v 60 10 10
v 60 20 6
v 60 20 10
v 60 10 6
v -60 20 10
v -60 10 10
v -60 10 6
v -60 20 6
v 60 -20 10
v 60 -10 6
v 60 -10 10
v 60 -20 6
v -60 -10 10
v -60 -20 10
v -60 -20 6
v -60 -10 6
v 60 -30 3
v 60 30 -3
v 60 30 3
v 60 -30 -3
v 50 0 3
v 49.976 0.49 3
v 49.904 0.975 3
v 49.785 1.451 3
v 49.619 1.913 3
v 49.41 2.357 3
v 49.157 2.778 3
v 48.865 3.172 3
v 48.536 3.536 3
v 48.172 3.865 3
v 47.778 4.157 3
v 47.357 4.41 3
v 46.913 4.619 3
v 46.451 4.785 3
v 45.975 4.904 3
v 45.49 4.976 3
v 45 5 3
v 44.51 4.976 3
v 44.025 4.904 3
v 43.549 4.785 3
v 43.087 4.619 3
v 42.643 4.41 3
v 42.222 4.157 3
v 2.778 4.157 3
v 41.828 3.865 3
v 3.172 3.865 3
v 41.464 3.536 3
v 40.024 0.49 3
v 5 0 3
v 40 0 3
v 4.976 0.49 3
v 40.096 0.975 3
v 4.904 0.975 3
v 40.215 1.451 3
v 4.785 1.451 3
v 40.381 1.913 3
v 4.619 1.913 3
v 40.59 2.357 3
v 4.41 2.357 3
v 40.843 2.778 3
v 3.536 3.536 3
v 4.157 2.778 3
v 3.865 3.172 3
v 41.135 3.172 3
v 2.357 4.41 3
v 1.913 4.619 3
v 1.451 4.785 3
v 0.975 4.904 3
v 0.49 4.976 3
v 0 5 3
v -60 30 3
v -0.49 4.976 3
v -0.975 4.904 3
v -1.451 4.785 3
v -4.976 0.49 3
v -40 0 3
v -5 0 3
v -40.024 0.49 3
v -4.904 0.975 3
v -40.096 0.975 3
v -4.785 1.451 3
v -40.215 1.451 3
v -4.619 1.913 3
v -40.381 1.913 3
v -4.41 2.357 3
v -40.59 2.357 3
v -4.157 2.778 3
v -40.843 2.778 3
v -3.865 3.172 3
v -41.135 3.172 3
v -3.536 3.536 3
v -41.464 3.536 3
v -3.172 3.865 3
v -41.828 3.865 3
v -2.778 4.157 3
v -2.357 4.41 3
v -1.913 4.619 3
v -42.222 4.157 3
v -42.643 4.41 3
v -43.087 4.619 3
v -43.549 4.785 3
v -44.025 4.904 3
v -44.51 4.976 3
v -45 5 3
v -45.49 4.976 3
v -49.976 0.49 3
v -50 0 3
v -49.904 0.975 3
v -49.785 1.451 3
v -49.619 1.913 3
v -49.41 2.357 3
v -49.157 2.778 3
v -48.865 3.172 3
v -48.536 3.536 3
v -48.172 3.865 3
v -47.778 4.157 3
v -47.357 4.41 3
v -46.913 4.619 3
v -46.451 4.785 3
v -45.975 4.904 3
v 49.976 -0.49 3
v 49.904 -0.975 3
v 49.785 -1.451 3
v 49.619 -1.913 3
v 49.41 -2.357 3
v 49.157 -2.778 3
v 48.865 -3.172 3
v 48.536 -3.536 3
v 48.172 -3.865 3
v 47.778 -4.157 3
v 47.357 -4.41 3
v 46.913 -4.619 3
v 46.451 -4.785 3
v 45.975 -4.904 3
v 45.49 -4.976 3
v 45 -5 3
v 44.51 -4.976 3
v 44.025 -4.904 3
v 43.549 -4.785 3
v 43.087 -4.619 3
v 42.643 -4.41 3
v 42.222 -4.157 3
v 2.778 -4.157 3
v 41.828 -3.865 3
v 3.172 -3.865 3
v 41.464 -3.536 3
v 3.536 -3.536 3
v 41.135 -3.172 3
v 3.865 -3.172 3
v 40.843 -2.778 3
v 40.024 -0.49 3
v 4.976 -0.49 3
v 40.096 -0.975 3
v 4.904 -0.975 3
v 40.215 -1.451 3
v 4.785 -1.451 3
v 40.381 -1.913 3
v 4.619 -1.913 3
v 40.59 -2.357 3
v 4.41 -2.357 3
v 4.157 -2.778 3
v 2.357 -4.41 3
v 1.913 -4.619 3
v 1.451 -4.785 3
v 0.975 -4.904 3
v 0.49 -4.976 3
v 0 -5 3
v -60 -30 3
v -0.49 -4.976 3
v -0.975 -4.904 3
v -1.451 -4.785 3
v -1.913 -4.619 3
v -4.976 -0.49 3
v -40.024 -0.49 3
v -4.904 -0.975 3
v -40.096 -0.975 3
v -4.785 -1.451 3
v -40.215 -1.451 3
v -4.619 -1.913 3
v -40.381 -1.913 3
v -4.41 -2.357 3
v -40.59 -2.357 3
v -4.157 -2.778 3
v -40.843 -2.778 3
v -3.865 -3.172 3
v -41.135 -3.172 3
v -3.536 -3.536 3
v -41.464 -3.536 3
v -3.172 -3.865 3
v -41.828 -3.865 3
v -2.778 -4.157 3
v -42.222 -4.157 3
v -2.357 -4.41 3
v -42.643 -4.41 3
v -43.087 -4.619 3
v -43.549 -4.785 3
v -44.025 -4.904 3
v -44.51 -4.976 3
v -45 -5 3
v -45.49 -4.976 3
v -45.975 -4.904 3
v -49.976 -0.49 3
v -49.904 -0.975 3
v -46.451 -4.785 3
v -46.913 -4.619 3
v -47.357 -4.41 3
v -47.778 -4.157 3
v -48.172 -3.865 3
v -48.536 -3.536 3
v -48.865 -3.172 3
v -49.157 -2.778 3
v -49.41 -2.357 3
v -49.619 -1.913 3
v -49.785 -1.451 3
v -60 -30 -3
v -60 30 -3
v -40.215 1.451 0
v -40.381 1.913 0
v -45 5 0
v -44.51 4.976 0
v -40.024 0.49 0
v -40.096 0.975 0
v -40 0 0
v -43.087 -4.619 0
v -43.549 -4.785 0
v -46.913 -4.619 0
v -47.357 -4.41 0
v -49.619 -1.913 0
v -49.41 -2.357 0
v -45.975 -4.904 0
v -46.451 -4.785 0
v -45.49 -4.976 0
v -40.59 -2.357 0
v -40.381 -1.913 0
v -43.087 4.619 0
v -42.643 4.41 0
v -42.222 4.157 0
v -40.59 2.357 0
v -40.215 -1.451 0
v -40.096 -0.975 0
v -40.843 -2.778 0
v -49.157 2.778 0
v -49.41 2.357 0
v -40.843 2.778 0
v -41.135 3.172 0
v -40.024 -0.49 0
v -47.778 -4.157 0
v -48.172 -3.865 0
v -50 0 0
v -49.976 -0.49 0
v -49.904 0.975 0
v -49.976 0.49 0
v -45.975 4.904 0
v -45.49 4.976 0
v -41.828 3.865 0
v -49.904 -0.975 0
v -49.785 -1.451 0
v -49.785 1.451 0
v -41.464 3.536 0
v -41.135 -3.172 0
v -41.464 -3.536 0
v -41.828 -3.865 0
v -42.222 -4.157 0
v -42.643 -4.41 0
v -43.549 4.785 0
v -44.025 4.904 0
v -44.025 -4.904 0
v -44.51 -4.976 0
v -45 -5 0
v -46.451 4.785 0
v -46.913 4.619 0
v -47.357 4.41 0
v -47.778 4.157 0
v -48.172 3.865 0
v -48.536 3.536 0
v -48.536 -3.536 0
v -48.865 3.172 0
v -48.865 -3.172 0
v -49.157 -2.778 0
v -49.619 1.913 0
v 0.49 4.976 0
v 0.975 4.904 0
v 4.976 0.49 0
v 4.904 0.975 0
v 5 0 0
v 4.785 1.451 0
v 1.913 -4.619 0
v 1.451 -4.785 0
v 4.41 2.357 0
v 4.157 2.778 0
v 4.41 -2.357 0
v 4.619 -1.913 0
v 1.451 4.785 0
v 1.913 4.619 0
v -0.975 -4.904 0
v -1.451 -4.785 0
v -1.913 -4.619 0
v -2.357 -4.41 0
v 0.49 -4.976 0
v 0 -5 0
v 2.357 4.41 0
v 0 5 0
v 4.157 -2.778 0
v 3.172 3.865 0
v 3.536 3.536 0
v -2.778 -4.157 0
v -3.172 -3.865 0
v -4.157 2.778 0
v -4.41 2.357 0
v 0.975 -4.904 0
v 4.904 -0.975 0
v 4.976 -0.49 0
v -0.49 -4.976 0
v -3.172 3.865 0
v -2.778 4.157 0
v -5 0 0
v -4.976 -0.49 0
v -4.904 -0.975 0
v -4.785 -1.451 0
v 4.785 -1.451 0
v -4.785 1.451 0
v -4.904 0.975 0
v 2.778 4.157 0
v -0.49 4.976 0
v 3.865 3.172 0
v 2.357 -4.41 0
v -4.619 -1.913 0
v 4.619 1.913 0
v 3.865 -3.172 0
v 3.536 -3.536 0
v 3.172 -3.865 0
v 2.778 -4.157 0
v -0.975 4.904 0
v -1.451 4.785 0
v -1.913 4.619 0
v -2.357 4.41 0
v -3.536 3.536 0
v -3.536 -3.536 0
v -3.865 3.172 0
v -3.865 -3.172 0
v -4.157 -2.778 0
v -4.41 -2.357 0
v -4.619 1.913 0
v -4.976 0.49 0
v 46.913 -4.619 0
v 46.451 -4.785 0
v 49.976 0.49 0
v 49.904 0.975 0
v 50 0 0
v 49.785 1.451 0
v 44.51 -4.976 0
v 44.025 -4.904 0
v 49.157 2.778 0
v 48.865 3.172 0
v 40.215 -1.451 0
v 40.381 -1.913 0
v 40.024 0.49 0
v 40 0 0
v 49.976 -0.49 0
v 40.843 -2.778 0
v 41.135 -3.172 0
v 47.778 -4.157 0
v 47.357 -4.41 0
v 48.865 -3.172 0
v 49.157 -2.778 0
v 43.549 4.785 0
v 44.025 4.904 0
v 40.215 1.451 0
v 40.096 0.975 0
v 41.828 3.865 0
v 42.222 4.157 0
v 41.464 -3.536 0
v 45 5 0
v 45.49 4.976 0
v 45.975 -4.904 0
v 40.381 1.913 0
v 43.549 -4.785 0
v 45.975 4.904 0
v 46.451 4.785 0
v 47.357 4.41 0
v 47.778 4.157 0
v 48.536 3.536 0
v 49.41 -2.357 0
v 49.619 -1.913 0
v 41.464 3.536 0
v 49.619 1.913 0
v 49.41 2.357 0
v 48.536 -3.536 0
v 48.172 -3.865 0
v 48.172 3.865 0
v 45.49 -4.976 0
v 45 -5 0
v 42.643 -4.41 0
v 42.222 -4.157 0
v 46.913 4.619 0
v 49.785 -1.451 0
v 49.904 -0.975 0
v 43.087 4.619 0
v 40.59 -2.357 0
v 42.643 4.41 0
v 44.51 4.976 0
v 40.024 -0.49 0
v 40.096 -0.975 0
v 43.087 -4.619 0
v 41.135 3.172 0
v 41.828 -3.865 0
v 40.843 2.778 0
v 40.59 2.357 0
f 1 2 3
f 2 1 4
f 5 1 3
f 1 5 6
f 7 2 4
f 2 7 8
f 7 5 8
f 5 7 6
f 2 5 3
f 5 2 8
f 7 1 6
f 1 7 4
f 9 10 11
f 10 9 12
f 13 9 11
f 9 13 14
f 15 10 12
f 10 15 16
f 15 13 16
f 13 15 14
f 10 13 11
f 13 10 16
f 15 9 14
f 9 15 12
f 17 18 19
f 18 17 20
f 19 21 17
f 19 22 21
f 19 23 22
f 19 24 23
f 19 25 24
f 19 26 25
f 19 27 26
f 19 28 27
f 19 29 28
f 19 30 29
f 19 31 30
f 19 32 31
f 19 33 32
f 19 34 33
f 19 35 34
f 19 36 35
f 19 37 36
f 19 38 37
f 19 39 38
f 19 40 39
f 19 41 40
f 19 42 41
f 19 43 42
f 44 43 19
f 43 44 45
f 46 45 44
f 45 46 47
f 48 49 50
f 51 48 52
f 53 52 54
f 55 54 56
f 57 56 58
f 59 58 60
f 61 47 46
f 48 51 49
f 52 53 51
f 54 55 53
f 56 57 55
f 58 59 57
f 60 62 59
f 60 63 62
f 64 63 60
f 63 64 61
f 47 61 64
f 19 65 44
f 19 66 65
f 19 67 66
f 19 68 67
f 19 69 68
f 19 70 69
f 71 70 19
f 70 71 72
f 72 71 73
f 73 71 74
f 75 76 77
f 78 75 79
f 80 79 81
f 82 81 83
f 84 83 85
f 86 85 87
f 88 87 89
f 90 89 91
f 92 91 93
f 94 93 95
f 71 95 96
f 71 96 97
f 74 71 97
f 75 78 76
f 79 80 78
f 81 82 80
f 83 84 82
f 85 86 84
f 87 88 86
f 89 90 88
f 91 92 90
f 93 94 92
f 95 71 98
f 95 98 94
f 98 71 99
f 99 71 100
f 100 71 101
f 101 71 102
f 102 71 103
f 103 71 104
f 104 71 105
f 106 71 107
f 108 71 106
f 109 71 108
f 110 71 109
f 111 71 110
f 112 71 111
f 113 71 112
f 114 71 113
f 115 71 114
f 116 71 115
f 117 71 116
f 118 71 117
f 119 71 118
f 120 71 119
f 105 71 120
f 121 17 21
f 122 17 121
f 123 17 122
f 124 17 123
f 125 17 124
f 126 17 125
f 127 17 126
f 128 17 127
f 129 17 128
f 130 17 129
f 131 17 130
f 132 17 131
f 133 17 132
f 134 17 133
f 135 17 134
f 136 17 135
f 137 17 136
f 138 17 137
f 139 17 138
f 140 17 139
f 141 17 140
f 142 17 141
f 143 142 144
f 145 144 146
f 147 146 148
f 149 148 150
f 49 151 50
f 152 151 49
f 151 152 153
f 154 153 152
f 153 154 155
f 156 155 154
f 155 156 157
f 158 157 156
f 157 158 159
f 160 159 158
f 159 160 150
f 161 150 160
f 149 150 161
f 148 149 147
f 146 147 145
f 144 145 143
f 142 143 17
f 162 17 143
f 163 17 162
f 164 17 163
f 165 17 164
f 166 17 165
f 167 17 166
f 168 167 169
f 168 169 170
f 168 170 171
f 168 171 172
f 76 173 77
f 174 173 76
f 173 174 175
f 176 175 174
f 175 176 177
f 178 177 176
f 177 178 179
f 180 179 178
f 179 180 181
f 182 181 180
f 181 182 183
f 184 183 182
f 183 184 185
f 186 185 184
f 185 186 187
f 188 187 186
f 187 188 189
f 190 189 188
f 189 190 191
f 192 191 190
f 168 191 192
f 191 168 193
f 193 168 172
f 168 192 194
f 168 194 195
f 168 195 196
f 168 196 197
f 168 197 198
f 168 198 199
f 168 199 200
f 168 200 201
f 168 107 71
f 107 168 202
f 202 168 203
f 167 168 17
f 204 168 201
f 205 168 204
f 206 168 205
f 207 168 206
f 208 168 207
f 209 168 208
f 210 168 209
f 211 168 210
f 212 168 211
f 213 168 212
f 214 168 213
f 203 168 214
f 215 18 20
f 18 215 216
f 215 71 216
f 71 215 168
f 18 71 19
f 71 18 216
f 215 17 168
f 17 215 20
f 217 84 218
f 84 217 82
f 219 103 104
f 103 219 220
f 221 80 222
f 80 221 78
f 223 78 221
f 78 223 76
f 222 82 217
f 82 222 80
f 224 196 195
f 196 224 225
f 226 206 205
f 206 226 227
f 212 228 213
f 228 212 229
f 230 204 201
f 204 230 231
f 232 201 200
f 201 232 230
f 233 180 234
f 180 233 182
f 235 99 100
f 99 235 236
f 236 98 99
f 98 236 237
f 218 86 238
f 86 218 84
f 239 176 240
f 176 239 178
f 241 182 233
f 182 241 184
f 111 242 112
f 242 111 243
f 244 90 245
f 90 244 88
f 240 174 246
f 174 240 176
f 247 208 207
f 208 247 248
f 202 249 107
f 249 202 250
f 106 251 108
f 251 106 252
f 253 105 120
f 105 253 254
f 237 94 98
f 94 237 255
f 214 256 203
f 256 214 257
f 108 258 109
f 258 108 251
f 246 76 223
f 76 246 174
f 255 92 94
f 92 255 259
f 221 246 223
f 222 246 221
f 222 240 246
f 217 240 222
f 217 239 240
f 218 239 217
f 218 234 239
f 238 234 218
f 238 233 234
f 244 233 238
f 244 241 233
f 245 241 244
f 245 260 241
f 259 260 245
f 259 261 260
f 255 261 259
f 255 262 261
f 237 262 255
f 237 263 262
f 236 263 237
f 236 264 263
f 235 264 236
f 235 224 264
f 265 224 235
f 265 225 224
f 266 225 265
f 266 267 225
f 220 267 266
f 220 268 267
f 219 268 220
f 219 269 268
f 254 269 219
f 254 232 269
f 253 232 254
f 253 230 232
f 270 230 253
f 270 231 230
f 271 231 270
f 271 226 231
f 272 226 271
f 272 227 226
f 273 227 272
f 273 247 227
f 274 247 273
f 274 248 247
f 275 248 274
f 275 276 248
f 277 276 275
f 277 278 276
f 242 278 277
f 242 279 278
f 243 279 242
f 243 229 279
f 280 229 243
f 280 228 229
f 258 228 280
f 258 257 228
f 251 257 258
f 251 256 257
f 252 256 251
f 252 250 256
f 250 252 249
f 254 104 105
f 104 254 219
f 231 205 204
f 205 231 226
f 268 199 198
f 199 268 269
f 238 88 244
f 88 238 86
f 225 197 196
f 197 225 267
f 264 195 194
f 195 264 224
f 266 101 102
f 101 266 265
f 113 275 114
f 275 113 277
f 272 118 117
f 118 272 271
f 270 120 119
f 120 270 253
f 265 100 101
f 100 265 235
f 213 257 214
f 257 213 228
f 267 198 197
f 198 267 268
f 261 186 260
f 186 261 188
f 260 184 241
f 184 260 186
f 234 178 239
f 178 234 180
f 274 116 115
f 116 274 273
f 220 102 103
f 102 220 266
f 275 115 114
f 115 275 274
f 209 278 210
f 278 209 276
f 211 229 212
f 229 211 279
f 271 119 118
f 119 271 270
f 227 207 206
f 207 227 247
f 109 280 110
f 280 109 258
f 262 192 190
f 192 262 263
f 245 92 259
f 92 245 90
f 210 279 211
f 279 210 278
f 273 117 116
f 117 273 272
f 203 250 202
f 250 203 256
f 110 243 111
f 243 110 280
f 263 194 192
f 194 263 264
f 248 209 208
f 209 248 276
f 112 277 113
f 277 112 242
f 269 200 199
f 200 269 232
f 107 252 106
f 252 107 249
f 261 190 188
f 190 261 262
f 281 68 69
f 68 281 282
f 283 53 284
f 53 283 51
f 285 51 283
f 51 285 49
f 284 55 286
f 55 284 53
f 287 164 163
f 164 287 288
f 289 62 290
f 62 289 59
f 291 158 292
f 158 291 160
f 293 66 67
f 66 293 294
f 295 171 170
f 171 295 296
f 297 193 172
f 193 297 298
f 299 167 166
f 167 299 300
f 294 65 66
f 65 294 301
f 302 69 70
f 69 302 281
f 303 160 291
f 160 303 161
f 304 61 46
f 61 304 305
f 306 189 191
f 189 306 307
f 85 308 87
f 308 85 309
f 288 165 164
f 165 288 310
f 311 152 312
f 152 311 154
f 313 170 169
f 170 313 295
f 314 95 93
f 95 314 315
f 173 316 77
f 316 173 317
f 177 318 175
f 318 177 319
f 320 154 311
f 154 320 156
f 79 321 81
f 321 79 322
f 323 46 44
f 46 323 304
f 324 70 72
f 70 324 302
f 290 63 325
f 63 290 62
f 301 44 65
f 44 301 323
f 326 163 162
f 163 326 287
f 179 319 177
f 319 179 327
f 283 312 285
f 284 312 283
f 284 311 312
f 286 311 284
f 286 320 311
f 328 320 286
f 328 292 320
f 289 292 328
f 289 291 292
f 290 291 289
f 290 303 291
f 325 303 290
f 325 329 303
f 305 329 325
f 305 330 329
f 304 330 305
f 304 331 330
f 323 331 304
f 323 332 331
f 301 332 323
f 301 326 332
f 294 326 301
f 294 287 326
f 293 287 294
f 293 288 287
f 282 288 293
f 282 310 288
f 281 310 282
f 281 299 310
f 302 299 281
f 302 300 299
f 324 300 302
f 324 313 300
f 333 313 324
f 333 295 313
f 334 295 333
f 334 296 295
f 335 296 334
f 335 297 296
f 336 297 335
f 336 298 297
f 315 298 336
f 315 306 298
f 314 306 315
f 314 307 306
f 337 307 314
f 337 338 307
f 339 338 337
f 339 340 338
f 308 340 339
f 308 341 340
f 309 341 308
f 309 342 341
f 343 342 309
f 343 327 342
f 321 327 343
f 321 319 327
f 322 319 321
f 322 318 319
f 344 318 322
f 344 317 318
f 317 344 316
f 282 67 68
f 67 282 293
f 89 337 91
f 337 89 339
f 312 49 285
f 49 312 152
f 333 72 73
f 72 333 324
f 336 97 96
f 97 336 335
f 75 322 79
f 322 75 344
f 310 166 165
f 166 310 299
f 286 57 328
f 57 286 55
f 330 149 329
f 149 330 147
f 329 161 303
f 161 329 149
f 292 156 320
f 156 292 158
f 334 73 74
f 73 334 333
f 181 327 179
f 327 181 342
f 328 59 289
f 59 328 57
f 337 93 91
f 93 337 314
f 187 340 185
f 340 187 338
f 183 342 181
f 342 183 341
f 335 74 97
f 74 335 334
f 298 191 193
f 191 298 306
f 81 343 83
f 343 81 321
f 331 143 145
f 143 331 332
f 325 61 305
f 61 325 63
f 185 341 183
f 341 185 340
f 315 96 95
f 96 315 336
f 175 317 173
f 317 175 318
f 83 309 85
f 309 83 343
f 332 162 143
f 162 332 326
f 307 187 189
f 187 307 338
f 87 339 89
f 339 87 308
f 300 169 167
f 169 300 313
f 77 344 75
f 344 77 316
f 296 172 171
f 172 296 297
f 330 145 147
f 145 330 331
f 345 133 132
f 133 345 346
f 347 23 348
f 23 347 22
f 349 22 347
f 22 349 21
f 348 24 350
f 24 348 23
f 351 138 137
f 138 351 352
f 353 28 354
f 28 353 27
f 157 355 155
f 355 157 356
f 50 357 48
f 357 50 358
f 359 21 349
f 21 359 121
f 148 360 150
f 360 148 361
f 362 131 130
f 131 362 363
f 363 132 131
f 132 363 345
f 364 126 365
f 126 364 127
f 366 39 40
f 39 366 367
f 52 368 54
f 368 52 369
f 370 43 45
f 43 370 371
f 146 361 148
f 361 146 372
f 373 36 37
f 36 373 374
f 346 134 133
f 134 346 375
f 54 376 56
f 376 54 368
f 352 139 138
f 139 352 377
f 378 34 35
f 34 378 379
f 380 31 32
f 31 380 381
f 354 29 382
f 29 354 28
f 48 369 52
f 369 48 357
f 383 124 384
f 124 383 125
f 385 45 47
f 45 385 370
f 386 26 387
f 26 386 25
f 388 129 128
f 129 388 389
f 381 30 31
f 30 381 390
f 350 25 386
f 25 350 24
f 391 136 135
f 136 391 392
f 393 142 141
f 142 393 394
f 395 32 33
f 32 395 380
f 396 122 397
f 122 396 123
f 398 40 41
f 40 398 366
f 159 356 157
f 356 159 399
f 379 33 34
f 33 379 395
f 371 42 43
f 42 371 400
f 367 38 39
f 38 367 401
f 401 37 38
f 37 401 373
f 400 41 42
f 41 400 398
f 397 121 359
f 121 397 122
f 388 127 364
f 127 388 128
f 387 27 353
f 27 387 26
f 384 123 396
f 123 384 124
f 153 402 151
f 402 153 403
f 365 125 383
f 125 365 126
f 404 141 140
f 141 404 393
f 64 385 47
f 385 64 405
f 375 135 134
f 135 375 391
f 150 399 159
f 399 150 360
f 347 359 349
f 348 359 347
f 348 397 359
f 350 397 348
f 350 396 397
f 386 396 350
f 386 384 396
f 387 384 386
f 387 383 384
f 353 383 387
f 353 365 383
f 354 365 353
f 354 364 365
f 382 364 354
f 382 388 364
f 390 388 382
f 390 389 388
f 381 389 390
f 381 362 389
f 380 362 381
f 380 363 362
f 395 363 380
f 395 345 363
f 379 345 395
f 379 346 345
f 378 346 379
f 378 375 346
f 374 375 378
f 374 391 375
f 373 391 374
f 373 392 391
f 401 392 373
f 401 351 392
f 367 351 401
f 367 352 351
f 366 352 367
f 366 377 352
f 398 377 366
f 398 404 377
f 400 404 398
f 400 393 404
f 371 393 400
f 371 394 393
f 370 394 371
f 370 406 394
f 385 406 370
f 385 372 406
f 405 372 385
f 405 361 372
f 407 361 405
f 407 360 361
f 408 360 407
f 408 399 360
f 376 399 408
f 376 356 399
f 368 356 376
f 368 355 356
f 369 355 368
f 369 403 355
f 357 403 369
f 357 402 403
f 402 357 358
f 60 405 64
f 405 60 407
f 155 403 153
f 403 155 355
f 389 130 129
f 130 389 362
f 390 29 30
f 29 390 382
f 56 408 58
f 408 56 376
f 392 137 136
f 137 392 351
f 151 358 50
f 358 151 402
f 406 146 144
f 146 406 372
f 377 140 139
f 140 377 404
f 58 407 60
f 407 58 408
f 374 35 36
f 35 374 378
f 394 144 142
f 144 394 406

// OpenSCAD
// Parameters
$fn = 64;

// Base Plate Dimensions (mm)
plate_length = 120;
plate_width  = 60;
plate_thick  = 6;

// Rib Dimensions (mm)
rib_height   = 4;
rib_width    = 10;
rib_offset_y = 15;

// Stepped Hole Dimensions (mm)
hole_x_positions = [-plate_length/2 + 15, 0, plate_length/2 - 15];
hole_y_position  = 0;
recess_diameter  = 16;
recess_depth     = 2;
bore_diameter    = 10;
bore_depth       = 4;

// Reusable Modules
module base_plate(len, wid, thk) {
    cube([len, wid, thk], center=true);
}

module pair_of_ribs(len, w, h, y_off) {
    translate([0, y_off, 0]) cube([len, w, h], center=true);
    translate([0, -y_off, 0]) cube([len, w, h], center=true);
}

module stepped_hole(x, y, top_z, r_d, r_h, b_d, b_h) {
    translate([x, y, top_z - r_h/2])
        cylinder(h=r_h, d=r_d, center=true);
    translate([x, y, top_z - r_h - b_h/2])
        cylinder(h=b_h, d=b_d, center=true);
}

// Main Assembly
difference() {
    union() {
        base_plate(plate_length, plate_width, plate_thick);
        translate([0, 0, plate_thick + rib_height/2])
            pair_of_ribs(plate_length, rib_width, rib_height, rib_offset_y);
    }

    for (x = hole_x_positions) {
        stepped_hole(x, hole_y_position, plate_thick,
                     recess_diameter, recess_depth,
                     bore_diameter, bore_depth);
    }
}
